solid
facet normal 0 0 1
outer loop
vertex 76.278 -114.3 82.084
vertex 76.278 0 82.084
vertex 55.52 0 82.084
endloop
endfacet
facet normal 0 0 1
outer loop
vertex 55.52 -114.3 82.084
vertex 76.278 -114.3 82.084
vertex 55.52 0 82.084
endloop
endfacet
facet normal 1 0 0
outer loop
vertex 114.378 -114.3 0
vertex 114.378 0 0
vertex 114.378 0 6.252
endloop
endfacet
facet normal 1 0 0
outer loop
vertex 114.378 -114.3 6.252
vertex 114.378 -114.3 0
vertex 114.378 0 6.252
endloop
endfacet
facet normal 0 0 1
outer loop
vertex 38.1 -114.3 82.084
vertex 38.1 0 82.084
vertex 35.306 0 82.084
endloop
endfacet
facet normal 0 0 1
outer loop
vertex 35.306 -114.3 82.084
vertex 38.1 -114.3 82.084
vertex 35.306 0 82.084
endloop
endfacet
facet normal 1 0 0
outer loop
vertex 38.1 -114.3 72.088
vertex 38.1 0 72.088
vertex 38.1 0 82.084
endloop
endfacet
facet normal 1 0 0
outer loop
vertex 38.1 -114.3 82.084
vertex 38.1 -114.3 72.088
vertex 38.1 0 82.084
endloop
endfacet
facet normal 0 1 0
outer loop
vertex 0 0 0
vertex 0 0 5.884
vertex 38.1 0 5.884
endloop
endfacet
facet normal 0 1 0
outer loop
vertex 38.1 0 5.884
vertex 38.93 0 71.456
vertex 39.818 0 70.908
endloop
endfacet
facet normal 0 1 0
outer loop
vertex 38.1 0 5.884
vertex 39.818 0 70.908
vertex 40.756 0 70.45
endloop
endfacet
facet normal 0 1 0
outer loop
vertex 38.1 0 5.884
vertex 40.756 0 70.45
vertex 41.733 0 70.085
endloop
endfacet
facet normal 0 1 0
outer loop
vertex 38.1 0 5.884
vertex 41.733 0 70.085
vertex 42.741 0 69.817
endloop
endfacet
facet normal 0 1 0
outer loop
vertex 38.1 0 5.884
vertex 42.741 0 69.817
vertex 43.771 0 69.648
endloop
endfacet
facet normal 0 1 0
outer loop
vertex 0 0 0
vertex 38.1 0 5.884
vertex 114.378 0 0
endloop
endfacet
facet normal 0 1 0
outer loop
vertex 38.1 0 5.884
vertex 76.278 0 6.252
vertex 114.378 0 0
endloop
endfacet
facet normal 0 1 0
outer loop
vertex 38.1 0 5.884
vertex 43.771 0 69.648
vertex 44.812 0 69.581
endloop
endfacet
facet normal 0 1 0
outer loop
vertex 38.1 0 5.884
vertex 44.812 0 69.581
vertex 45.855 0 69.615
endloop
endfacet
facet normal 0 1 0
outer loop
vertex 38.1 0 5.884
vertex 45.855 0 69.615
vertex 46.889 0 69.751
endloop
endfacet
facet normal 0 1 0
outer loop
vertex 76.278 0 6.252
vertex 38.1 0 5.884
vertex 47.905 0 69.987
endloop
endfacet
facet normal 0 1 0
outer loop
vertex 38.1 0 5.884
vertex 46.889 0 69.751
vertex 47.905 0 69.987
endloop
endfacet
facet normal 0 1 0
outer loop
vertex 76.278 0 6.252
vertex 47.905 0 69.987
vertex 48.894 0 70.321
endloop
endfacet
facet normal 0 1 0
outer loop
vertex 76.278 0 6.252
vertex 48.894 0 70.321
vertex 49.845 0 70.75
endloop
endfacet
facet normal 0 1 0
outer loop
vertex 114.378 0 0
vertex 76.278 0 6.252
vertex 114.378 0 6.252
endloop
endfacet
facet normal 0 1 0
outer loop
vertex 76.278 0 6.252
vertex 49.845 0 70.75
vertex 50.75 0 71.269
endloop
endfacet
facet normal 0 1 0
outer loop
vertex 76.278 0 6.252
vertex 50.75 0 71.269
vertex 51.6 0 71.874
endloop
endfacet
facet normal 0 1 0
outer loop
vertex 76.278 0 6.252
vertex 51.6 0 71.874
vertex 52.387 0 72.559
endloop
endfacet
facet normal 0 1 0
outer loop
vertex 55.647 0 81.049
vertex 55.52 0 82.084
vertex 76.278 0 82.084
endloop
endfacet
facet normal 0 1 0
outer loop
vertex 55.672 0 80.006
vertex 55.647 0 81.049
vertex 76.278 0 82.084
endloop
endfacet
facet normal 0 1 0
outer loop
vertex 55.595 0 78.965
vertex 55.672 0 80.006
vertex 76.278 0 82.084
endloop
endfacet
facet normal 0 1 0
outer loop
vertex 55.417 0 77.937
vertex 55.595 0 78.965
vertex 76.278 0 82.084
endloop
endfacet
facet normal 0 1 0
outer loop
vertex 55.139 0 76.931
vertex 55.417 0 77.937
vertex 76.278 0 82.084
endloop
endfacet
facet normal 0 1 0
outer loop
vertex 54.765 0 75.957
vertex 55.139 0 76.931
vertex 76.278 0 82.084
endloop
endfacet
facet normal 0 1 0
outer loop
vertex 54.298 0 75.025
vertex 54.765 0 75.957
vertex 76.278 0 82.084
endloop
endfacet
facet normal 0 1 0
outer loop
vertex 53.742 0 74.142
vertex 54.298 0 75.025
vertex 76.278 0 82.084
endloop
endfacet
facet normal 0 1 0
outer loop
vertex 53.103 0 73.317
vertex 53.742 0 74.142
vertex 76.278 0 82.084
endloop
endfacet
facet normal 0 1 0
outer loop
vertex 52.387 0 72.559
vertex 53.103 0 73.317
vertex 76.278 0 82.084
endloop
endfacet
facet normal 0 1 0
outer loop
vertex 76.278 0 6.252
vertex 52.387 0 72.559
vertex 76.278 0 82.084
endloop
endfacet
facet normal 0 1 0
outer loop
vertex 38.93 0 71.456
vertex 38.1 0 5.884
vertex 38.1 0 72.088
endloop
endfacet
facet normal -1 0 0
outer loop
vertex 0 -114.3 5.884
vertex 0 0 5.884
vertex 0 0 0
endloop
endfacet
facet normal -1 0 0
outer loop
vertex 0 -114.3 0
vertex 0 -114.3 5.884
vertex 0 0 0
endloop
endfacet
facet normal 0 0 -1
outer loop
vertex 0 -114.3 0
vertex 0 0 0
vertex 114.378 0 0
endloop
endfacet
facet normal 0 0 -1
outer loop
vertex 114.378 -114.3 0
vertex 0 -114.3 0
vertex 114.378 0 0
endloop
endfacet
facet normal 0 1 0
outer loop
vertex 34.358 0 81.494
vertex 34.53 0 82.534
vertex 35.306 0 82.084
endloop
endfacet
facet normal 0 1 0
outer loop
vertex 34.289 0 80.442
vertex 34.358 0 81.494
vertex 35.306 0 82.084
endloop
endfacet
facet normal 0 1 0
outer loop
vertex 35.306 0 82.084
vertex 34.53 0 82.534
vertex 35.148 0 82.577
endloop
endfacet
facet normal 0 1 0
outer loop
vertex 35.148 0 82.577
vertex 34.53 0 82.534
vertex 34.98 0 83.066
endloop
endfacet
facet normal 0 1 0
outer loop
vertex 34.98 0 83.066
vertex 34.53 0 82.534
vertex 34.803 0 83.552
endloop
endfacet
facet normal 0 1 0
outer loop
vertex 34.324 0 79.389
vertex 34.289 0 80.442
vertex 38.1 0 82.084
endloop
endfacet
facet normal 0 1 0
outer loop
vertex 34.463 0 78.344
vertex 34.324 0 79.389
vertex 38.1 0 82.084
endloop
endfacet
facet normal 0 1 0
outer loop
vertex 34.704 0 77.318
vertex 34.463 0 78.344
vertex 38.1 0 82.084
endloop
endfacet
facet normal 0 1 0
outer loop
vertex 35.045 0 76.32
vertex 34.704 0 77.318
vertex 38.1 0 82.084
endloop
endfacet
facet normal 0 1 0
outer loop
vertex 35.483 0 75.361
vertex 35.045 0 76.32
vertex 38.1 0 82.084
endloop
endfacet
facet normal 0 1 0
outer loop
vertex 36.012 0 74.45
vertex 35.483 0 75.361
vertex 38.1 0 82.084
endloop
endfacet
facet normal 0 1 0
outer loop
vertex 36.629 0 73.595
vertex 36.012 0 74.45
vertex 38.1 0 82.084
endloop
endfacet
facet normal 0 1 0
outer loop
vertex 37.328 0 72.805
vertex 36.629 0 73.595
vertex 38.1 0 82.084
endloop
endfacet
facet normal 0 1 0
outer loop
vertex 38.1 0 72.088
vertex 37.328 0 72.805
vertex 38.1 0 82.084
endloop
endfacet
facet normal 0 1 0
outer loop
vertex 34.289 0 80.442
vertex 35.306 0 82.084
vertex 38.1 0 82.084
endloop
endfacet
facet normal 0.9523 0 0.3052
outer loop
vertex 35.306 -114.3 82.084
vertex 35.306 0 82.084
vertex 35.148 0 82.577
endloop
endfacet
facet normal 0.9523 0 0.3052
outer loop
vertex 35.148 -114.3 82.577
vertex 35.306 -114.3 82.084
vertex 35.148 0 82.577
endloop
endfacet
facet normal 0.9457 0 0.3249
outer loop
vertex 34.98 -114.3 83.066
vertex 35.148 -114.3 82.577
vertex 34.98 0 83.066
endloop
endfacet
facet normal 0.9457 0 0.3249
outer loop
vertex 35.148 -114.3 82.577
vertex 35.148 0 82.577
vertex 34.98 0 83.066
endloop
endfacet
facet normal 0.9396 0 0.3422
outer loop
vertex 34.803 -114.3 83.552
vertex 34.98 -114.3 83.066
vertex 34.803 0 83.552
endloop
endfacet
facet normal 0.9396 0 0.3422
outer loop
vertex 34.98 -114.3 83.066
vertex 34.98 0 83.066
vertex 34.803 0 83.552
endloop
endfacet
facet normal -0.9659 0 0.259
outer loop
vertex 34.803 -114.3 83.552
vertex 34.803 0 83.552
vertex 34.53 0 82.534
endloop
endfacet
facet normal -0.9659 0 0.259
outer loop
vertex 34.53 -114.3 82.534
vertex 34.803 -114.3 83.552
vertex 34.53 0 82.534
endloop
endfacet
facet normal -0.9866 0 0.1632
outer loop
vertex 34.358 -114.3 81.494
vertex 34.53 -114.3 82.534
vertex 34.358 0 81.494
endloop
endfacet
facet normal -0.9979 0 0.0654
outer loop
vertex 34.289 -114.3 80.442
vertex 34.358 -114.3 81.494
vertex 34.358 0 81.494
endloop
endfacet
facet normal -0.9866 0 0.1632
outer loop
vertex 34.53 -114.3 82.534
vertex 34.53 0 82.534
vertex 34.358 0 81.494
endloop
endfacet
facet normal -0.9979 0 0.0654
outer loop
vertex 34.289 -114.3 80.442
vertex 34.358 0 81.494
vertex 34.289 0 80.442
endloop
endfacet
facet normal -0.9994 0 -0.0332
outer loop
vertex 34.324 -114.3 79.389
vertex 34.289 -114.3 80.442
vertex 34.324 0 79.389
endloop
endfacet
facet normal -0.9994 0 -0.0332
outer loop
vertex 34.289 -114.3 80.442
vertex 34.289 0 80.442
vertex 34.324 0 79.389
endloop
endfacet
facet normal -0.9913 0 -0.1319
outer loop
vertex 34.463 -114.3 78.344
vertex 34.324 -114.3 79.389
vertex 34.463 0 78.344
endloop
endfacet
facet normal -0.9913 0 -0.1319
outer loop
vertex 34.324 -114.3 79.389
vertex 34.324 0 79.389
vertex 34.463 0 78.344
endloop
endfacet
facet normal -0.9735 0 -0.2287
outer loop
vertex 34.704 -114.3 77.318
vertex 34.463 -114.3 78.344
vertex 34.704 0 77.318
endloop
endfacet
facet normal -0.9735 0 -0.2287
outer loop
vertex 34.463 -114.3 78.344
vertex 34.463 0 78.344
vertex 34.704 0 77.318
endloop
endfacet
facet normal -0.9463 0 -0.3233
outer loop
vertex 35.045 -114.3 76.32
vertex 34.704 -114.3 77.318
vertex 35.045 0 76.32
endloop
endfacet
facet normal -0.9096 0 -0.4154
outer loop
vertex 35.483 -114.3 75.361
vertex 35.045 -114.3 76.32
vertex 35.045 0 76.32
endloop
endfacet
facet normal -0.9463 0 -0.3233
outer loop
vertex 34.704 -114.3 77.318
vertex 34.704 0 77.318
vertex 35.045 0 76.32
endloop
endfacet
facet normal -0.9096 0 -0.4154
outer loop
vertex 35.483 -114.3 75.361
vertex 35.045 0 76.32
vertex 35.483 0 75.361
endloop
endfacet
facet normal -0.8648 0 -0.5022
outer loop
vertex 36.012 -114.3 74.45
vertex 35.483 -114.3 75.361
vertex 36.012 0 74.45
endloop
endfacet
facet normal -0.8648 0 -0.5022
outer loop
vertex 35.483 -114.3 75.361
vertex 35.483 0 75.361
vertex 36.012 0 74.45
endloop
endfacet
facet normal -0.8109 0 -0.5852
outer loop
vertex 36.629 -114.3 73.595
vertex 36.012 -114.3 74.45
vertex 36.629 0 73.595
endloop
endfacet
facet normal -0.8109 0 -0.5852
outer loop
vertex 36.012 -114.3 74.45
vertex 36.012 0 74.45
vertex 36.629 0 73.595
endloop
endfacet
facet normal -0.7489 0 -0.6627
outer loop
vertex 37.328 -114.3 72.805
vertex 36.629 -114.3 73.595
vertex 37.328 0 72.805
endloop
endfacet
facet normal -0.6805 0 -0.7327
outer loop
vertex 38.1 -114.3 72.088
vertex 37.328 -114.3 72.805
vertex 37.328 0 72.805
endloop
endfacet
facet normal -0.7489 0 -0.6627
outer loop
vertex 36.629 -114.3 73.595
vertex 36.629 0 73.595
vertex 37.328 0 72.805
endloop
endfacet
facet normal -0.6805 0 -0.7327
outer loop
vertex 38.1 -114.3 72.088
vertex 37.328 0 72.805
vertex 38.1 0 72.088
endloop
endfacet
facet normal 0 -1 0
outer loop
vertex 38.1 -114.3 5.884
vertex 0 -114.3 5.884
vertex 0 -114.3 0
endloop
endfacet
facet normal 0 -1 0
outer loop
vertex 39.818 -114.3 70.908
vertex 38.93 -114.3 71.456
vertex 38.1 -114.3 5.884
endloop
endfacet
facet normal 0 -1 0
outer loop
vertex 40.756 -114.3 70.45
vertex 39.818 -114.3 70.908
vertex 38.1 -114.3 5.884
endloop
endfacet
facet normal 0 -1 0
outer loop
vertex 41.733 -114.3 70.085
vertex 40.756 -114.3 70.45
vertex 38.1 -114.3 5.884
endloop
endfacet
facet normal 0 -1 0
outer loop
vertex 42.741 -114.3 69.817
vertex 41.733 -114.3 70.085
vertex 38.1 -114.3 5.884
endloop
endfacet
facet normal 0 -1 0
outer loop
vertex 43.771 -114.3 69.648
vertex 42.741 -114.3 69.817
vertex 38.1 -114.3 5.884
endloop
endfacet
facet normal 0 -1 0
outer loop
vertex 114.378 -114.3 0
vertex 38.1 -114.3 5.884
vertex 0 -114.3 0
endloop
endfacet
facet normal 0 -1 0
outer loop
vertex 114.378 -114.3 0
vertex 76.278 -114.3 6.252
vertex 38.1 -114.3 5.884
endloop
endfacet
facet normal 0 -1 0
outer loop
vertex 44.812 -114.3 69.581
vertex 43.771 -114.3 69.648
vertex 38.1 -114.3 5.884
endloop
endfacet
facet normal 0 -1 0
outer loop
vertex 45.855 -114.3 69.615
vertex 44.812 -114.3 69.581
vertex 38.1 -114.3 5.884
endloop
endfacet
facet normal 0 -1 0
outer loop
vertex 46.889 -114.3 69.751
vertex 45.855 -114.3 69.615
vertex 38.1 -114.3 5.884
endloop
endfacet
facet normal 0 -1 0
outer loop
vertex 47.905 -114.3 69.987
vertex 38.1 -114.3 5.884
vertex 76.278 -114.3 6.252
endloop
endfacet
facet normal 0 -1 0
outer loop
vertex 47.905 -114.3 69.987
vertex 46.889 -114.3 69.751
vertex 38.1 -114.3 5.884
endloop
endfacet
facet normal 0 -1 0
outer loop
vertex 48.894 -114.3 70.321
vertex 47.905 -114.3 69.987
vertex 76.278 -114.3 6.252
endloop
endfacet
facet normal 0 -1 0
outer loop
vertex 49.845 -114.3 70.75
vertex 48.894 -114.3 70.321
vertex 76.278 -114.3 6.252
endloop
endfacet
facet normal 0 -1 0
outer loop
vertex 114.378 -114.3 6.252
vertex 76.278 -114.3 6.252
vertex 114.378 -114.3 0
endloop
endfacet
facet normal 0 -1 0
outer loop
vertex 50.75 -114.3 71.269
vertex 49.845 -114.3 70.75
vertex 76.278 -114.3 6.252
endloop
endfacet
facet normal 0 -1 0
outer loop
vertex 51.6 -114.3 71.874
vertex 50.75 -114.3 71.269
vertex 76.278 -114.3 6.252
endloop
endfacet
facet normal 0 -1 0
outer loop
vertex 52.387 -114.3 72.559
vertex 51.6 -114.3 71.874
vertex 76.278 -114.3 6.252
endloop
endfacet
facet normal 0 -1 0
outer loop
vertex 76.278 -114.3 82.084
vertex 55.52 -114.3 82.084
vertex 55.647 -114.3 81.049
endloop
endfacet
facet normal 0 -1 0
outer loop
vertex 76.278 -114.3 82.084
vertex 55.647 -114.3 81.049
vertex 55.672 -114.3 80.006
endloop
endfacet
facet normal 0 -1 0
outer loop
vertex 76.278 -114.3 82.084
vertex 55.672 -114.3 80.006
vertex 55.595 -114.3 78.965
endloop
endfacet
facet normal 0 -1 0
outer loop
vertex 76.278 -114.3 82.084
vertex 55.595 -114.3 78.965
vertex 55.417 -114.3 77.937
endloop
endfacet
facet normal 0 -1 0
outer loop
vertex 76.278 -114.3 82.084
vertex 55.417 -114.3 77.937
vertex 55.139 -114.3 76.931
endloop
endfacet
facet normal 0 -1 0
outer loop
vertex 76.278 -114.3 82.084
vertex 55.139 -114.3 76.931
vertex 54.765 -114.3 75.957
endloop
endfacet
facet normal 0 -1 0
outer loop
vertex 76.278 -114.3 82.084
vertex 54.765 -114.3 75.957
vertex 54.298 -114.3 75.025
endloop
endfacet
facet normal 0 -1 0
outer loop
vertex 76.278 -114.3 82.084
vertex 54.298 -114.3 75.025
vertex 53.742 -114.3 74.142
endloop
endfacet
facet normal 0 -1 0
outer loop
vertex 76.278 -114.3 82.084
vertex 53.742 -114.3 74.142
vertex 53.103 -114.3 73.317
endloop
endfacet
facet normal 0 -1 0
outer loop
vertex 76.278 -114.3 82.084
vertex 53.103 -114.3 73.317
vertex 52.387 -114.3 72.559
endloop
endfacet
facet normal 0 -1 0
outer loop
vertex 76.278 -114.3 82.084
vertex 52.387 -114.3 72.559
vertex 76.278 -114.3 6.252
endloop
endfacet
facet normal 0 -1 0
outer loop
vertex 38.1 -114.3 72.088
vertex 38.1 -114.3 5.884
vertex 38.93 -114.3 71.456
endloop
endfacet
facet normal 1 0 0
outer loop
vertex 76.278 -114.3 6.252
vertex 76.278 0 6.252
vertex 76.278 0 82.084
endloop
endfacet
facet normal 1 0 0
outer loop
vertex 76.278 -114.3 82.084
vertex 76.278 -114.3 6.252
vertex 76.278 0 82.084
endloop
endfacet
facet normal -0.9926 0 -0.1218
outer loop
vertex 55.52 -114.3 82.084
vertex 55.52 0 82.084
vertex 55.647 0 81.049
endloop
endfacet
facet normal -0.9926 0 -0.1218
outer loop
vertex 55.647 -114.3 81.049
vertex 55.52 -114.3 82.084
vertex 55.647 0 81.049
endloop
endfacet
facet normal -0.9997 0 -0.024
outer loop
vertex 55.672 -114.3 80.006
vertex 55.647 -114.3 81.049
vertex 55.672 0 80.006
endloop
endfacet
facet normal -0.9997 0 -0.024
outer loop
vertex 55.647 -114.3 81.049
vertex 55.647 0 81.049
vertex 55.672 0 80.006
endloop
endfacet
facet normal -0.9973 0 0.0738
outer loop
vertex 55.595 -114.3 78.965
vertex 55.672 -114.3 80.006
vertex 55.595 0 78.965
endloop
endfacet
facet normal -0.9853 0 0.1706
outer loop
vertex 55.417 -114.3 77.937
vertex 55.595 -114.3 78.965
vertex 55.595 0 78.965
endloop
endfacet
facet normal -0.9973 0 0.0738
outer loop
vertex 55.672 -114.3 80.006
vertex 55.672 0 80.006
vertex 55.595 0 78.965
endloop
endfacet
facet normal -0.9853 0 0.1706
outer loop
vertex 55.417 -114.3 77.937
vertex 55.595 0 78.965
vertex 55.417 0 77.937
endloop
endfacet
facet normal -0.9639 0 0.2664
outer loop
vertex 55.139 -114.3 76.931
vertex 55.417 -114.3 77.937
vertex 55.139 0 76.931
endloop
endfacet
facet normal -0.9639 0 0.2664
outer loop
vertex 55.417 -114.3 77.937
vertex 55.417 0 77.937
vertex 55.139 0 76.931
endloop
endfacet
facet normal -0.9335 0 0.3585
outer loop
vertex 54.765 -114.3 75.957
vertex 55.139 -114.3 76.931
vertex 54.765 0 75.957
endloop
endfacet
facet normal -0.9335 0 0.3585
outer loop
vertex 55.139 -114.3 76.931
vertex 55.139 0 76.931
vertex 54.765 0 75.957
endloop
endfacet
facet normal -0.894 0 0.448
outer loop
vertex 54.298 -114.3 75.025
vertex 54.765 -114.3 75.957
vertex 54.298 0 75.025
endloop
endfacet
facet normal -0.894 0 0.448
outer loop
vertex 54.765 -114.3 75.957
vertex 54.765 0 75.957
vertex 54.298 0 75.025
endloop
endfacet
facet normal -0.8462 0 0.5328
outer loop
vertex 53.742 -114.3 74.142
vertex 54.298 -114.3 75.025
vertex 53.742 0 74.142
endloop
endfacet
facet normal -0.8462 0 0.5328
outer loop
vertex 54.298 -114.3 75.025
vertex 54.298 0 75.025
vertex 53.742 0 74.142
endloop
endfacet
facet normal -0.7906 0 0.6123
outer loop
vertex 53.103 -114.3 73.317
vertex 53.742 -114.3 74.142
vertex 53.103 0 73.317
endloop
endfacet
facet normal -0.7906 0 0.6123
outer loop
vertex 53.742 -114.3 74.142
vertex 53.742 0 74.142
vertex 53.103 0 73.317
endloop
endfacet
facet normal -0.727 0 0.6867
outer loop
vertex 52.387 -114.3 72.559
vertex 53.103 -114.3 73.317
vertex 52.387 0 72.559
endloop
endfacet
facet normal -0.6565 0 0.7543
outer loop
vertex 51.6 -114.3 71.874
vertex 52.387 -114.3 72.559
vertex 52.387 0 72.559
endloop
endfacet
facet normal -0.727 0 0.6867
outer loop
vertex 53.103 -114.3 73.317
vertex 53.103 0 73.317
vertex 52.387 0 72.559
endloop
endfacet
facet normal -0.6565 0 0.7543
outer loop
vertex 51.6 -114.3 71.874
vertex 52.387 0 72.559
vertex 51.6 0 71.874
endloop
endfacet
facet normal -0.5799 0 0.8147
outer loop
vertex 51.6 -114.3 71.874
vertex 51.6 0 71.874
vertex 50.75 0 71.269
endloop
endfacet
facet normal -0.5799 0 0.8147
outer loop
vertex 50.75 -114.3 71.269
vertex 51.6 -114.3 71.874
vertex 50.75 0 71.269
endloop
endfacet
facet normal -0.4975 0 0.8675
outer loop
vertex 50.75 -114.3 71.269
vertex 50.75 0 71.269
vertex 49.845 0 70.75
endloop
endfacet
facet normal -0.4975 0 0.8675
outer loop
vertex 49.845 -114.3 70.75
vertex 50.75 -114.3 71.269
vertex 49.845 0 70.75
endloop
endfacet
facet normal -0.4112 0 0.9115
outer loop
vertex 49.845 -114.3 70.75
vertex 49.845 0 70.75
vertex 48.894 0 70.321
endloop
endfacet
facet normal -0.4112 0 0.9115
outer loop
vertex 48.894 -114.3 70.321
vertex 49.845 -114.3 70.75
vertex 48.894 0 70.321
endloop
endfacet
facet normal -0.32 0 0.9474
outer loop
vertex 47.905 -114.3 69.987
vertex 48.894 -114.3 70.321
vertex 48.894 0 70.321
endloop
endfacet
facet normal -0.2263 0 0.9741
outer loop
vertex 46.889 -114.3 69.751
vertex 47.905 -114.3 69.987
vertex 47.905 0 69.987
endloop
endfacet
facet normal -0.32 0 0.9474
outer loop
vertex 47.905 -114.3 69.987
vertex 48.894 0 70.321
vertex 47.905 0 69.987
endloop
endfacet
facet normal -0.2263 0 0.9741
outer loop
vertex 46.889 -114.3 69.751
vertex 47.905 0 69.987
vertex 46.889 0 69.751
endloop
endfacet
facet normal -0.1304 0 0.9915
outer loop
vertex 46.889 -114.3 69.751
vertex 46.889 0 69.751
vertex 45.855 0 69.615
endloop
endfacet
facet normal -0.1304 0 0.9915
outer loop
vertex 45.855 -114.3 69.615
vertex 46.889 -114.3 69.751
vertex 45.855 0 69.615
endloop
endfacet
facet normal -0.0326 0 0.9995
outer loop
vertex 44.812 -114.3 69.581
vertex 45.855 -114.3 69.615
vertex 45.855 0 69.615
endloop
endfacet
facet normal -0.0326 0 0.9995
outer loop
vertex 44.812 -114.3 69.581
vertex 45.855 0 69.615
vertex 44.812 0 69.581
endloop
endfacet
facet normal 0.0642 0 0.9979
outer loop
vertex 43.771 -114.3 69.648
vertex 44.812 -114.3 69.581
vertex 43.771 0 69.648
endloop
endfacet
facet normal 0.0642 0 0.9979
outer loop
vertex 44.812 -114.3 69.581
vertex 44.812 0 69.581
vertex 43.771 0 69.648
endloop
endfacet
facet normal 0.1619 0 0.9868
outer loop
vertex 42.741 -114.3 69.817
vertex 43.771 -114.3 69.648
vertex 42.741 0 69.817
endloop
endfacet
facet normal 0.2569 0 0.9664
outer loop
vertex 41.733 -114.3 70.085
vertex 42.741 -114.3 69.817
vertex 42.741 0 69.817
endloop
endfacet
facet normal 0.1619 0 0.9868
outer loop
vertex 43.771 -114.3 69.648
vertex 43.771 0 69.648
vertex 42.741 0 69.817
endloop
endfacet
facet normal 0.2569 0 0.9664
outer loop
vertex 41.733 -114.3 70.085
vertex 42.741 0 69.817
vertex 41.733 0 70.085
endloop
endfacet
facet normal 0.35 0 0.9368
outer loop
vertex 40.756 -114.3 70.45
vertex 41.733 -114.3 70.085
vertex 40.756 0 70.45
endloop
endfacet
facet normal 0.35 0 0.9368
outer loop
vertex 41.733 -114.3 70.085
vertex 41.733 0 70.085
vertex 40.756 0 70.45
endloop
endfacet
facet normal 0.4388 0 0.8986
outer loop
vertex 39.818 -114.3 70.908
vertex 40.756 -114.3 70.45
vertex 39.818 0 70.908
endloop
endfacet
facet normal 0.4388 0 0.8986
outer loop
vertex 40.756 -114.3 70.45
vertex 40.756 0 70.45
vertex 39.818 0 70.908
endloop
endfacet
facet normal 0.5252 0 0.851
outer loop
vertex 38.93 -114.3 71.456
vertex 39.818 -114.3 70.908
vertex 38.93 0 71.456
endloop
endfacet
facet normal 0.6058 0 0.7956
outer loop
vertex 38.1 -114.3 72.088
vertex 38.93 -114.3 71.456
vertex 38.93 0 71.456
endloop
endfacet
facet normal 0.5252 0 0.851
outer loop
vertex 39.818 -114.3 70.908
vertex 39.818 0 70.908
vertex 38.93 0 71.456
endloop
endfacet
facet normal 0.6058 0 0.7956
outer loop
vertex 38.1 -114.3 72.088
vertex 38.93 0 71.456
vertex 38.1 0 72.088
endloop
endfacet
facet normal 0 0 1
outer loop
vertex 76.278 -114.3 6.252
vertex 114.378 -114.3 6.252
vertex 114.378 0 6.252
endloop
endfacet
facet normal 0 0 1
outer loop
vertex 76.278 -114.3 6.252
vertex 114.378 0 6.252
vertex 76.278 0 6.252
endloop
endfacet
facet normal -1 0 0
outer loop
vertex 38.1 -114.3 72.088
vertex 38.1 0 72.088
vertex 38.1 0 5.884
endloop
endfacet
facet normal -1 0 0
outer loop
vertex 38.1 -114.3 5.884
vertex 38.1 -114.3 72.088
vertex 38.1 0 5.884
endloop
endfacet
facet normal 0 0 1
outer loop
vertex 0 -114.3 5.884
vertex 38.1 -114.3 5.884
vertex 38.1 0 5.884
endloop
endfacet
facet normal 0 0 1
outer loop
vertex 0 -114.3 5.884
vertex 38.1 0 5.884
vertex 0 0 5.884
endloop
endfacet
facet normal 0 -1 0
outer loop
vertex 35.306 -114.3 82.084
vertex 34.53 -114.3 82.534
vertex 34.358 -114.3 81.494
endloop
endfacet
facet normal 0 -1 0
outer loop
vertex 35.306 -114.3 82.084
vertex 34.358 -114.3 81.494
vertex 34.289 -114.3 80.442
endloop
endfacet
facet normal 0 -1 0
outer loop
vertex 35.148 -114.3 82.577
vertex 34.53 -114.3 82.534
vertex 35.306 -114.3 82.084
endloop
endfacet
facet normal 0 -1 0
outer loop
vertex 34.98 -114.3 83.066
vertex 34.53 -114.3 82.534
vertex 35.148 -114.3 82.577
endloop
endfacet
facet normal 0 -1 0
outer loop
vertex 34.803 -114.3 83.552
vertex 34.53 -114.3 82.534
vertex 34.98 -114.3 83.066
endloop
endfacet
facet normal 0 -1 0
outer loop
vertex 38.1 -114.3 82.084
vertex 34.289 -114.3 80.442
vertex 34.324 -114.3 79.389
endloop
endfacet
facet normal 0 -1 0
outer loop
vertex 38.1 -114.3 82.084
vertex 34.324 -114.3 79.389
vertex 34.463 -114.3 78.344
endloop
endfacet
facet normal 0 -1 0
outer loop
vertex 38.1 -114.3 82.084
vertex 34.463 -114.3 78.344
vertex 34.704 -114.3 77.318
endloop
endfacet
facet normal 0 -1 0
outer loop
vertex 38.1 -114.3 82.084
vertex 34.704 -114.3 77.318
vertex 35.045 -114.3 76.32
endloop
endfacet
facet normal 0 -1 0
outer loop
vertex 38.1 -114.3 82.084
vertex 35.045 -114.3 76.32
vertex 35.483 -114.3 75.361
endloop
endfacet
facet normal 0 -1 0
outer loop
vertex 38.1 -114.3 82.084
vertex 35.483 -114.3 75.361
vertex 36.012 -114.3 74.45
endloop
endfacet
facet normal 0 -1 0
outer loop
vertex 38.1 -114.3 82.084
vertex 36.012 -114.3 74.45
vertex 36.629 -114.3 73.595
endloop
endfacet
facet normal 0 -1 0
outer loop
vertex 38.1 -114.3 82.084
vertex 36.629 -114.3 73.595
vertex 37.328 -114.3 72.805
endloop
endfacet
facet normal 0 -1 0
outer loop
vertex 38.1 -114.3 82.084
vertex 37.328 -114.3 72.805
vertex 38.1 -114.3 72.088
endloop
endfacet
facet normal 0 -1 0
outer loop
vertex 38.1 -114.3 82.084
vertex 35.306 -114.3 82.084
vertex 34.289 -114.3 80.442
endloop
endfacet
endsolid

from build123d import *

# Parameters (mm, degrees)
F1_DEPTH = 114.3


with BuildPart() as f1:
    # F0 (on Front) → F1 (new body)
    with BuildSketch(Plane.XZ):
        with BuildLine():
            ThreePointArc((34.802985, 83.55242), (34.704284, 77.31763), (38.1, 72.087768))
            Line((38.1, 72.087768), (38.1, 82.084319))
            Line((38.1, 82.084319), (35.305936, 82.084319))
            ThreePointArc((35.305936, 82.084319), (35.065358, 82.822103), (34.802985, 83.55242))
        make_face()
        with BuildLine():
            Line((0, 5.884319), (0, 0))
            Line((0, 0), (114.377856, 0))
            Line((114.377856, 0), (114.377856, 6.252089))
            Line((114.377856, 6.252089), (76.277856, 6.252089))
            Line((76.277856, 6.252089), (76.277856, 49.352775))
            Line((76.277856, 49.352775), (76.277856, 64.017227))
            Line((76.277856, 64.017227), (76.277856, 82.084319))
            Line((76.277856, 82.084319), (55.520416, 82.084319))
            ThreePointArc((55.520416, 82.084319), (50.303697, 70.99814), (38.1, 72.087768))
            Line((38.1, 72.087768), (38.1, 5.884319))
            Line((38.1, 5.884319), (0, 5.884319))
        make_face()
    extrude(amount=F1_DEPTH)


solid = f1.part
